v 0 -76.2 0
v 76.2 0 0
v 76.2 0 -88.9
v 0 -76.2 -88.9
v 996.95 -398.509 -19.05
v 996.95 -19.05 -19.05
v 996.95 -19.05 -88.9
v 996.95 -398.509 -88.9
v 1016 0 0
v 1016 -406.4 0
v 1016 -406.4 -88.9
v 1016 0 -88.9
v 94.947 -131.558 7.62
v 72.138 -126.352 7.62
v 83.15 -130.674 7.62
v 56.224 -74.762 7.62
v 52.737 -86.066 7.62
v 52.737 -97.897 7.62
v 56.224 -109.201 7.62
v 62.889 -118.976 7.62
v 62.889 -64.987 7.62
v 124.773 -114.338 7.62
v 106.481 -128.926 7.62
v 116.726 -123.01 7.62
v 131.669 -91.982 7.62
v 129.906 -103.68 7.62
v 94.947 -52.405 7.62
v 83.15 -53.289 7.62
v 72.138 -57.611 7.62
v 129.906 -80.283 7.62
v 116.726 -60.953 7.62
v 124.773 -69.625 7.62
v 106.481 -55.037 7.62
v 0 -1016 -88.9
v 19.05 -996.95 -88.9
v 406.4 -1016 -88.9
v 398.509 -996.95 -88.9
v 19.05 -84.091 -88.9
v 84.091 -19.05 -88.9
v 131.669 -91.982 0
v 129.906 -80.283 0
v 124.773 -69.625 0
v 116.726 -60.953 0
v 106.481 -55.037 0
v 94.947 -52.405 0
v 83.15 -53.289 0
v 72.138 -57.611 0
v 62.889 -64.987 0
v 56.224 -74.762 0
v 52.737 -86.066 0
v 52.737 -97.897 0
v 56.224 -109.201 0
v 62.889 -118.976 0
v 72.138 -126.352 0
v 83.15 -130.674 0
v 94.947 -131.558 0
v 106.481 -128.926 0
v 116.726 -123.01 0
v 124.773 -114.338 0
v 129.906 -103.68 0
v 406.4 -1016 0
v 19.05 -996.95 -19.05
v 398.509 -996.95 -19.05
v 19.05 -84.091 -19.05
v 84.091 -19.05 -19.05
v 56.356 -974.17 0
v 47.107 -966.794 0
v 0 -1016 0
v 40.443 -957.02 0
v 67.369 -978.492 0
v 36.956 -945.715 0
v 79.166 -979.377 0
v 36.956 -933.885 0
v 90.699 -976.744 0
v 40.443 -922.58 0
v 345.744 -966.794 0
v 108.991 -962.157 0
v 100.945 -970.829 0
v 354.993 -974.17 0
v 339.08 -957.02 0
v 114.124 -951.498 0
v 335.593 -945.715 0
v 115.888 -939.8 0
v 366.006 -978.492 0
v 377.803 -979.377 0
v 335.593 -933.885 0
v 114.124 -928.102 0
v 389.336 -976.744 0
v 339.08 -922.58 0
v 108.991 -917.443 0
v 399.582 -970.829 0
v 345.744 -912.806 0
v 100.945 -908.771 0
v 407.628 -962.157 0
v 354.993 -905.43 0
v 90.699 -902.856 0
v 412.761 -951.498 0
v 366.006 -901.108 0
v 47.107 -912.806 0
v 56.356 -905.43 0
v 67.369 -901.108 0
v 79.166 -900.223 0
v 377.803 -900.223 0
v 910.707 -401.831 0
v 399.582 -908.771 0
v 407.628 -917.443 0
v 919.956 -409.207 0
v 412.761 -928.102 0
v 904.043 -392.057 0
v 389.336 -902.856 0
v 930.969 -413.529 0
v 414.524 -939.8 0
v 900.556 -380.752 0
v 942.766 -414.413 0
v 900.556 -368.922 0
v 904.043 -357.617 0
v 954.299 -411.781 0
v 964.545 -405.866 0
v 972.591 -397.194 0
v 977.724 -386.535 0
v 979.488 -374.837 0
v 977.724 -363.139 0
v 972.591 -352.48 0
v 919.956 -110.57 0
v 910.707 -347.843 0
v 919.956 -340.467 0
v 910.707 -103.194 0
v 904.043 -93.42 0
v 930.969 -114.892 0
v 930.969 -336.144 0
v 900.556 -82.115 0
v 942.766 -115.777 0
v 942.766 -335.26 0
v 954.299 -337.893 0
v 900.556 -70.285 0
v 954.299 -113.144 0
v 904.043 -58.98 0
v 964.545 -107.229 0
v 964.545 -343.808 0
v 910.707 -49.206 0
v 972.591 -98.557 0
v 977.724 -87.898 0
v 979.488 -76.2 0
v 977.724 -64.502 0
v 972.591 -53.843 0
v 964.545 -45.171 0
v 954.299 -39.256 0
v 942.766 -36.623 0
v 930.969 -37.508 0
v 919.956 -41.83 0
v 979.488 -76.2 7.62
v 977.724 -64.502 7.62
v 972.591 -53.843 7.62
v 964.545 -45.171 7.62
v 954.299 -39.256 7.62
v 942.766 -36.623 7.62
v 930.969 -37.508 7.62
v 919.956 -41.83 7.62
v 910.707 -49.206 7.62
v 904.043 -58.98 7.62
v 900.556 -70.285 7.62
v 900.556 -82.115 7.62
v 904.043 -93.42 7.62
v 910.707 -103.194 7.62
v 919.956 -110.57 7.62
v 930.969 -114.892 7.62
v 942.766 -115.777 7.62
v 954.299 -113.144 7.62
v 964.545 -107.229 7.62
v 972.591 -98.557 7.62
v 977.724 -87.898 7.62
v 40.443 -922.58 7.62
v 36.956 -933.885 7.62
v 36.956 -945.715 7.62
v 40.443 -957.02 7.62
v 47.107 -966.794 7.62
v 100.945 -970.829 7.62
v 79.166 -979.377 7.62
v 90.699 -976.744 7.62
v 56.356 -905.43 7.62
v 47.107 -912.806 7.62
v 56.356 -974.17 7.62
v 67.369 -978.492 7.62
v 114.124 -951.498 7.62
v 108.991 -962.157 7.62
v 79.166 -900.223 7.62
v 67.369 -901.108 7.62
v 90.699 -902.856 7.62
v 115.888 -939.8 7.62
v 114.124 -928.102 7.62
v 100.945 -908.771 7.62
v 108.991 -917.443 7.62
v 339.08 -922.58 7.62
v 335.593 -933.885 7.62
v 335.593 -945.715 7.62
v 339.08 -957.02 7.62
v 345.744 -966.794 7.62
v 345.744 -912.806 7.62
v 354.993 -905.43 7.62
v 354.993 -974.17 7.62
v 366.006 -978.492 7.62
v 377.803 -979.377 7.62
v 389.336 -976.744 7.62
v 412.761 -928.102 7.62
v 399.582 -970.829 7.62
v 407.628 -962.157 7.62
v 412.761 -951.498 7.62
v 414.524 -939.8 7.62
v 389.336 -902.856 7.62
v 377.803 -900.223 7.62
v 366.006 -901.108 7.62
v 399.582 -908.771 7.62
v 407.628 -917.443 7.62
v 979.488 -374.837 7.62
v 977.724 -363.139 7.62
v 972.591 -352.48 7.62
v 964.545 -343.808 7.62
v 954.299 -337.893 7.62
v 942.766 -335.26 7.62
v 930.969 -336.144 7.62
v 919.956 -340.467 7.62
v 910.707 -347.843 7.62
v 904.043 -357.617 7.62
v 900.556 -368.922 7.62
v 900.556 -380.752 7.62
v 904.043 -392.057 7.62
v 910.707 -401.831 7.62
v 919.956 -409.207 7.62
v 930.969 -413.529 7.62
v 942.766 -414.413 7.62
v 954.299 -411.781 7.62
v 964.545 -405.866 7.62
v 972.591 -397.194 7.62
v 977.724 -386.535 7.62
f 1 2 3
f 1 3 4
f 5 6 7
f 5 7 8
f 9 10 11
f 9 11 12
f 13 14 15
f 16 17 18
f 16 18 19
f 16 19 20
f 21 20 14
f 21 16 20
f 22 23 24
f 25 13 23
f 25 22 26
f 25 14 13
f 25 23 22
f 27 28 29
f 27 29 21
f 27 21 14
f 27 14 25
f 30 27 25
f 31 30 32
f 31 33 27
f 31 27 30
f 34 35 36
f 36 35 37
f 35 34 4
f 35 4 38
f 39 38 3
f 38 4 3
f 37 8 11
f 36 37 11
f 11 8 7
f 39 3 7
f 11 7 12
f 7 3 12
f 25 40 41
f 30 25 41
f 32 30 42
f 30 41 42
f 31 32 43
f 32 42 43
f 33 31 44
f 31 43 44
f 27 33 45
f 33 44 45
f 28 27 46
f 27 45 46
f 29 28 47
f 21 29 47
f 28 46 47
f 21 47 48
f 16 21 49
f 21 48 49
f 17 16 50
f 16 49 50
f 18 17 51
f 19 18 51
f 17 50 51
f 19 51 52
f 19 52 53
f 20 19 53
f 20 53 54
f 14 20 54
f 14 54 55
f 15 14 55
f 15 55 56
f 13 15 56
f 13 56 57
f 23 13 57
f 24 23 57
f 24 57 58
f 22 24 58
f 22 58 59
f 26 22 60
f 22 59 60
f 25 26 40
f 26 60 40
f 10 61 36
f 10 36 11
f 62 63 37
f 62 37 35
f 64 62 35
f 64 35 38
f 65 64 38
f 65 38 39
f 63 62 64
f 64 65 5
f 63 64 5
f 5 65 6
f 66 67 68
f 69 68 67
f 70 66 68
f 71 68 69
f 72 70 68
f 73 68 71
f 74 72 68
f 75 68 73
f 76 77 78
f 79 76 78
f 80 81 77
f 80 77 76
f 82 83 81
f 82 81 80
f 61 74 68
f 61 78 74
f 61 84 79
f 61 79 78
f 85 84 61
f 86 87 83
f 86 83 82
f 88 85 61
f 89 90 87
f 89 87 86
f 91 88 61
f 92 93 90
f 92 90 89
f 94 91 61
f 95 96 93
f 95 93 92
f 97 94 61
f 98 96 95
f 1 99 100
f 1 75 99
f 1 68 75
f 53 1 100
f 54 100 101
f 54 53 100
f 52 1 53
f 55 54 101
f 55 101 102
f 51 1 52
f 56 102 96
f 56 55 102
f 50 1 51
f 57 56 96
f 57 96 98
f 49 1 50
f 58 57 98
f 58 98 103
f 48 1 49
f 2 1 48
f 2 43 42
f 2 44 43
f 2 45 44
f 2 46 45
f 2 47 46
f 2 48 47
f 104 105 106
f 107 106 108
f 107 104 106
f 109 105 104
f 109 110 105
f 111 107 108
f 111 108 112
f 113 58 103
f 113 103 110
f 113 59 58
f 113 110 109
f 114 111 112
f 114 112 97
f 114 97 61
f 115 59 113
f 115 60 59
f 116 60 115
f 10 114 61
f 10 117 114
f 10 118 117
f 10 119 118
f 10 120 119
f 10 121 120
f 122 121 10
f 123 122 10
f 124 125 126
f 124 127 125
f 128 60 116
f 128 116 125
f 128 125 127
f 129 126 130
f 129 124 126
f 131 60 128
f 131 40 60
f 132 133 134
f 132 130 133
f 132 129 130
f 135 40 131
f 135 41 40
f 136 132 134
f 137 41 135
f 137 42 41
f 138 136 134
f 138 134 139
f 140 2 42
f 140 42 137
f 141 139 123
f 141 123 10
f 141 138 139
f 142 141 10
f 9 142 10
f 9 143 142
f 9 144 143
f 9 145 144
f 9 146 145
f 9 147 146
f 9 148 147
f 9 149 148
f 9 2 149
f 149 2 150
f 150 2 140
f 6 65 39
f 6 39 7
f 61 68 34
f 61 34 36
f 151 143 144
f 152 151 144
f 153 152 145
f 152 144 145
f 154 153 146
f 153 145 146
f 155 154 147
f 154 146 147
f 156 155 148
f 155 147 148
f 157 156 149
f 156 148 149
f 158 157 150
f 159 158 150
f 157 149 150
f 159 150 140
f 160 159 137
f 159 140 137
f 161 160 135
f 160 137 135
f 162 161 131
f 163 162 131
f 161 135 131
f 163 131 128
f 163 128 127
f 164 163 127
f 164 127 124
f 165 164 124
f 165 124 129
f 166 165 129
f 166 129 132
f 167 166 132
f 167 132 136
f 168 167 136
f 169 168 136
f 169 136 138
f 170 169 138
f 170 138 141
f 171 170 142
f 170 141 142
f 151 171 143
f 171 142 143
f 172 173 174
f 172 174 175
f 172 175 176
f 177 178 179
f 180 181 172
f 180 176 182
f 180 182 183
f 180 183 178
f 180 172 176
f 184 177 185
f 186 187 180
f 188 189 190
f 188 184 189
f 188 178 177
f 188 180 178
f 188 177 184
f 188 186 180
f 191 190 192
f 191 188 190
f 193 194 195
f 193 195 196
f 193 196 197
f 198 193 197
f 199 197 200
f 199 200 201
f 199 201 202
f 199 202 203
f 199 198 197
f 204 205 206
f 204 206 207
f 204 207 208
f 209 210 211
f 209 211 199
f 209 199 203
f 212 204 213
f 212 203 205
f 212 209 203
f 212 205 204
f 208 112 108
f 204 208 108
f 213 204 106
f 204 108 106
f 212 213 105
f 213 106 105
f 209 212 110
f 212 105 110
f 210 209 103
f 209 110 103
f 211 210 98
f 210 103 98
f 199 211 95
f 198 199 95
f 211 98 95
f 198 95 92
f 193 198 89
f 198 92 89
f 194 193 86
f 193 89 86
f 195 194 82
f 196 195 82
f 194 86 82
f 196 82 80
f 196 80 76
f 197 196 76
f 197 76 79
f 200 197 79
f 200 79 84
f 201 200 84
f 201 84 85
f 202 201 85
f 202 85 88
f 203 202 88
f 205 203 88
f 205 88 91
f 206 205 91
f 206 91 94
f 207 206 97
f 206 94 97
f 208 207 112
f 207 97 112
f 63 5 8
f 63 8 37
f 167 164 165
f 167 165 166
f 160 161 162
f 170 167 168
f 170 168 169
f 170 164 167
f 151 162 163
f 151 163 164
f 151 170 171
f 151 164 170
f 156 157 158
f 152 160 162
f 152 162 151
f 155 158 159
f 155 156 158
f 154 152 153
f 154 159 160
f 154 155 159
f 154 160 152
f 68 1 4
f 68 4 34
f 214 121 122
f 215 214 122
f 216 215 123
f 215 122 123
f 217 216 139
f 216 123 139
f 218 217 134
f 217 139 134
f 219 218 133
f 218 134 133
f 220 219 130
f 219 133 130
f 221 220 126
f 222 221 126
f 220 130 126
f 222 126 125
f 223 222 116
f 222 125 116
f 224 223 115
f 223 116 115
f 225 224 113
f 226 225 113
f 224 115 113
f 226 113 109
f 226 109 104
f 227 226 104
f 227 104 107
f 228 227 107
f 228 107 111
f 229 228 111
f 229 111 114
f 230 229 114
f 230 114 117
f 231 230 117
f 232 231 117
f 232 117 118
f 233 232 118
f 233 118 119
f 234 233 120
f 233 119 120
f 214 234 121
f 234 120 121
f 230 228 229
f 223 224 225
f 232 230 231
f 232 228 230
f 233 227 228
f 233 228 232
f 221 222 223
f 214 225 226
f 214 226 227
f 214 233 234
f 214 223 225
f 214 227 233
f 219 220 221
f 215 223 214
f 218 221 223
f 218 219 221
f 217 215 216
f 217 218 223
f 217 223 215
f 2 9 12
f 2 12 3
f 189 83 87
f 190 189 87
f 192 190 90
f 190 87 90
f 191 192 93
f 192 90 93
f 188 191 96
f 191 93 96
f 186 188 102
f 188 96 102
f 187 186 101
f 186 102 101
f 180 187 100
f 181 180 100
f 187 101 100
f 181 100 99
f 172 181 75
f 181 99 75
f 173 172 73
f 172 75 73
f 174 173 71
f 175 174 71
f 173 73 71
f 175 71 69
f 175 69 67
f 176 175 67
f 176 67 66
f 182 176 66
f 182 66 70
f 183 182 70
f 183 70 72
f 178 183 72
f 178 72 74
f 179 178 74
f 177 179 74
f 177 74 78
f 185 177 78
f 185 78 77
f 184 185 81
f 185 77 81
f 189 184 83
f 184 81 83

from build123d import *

# Parameters (mm, degrees)
F1_DEPTH = 88.9
F2_DEPTH = 19.05
F3_R     = 39.6875
F4_DEPTH = 7.62


with BuildPart() as f1:
    # F0 (on Top) → F1 (new body)
    with BuildSketch(Plane.XY):
        Polygon((0, -76.2), (0, -1016), (406.4, -1016), (1016, -406.4), (1016, 0), (76.2, 0), align=None)
        Polygon((398.509232, -996.95), (19.05, -996.95), (19.05, -84.090768), (84.090768, -19.05), (996.95, -19.05), (996.95, -398.509232), align=None, mode=Mode.SUBTRACT)
    extrude(amount=-F1_DEPTH)

    # F0 (on Top) → F2 (join)
    with BuildSketch(Plane.XY):
        Polygon((19.05, -84.090768), (19.05, -996.95), (398.509232, -996.95), (996.95, -398.509232), (996.95, -19.05), (84.090768, -19.05), align=None)
    extrude(amount=-F2_DEPTH)

    # F3 (on face) → F4 (join)
    with BuildSketch(Plane.XY):
        with Locations((76.2, -939.8)):
            Circle(F3_R)
        with Locations((91.981537, -91.981537)):
            Circle(F3_R)
        with Locations((374.836927, -939.8)):
            Circle(F3_R)
        with Locations((939.8, -374.836927)):
            Circle(F3_R)
        with Locations((939.8, -76.2)):
            Circle(F3_R)
    extrude(amount=F4_DEPTH)


solid = f1.part
